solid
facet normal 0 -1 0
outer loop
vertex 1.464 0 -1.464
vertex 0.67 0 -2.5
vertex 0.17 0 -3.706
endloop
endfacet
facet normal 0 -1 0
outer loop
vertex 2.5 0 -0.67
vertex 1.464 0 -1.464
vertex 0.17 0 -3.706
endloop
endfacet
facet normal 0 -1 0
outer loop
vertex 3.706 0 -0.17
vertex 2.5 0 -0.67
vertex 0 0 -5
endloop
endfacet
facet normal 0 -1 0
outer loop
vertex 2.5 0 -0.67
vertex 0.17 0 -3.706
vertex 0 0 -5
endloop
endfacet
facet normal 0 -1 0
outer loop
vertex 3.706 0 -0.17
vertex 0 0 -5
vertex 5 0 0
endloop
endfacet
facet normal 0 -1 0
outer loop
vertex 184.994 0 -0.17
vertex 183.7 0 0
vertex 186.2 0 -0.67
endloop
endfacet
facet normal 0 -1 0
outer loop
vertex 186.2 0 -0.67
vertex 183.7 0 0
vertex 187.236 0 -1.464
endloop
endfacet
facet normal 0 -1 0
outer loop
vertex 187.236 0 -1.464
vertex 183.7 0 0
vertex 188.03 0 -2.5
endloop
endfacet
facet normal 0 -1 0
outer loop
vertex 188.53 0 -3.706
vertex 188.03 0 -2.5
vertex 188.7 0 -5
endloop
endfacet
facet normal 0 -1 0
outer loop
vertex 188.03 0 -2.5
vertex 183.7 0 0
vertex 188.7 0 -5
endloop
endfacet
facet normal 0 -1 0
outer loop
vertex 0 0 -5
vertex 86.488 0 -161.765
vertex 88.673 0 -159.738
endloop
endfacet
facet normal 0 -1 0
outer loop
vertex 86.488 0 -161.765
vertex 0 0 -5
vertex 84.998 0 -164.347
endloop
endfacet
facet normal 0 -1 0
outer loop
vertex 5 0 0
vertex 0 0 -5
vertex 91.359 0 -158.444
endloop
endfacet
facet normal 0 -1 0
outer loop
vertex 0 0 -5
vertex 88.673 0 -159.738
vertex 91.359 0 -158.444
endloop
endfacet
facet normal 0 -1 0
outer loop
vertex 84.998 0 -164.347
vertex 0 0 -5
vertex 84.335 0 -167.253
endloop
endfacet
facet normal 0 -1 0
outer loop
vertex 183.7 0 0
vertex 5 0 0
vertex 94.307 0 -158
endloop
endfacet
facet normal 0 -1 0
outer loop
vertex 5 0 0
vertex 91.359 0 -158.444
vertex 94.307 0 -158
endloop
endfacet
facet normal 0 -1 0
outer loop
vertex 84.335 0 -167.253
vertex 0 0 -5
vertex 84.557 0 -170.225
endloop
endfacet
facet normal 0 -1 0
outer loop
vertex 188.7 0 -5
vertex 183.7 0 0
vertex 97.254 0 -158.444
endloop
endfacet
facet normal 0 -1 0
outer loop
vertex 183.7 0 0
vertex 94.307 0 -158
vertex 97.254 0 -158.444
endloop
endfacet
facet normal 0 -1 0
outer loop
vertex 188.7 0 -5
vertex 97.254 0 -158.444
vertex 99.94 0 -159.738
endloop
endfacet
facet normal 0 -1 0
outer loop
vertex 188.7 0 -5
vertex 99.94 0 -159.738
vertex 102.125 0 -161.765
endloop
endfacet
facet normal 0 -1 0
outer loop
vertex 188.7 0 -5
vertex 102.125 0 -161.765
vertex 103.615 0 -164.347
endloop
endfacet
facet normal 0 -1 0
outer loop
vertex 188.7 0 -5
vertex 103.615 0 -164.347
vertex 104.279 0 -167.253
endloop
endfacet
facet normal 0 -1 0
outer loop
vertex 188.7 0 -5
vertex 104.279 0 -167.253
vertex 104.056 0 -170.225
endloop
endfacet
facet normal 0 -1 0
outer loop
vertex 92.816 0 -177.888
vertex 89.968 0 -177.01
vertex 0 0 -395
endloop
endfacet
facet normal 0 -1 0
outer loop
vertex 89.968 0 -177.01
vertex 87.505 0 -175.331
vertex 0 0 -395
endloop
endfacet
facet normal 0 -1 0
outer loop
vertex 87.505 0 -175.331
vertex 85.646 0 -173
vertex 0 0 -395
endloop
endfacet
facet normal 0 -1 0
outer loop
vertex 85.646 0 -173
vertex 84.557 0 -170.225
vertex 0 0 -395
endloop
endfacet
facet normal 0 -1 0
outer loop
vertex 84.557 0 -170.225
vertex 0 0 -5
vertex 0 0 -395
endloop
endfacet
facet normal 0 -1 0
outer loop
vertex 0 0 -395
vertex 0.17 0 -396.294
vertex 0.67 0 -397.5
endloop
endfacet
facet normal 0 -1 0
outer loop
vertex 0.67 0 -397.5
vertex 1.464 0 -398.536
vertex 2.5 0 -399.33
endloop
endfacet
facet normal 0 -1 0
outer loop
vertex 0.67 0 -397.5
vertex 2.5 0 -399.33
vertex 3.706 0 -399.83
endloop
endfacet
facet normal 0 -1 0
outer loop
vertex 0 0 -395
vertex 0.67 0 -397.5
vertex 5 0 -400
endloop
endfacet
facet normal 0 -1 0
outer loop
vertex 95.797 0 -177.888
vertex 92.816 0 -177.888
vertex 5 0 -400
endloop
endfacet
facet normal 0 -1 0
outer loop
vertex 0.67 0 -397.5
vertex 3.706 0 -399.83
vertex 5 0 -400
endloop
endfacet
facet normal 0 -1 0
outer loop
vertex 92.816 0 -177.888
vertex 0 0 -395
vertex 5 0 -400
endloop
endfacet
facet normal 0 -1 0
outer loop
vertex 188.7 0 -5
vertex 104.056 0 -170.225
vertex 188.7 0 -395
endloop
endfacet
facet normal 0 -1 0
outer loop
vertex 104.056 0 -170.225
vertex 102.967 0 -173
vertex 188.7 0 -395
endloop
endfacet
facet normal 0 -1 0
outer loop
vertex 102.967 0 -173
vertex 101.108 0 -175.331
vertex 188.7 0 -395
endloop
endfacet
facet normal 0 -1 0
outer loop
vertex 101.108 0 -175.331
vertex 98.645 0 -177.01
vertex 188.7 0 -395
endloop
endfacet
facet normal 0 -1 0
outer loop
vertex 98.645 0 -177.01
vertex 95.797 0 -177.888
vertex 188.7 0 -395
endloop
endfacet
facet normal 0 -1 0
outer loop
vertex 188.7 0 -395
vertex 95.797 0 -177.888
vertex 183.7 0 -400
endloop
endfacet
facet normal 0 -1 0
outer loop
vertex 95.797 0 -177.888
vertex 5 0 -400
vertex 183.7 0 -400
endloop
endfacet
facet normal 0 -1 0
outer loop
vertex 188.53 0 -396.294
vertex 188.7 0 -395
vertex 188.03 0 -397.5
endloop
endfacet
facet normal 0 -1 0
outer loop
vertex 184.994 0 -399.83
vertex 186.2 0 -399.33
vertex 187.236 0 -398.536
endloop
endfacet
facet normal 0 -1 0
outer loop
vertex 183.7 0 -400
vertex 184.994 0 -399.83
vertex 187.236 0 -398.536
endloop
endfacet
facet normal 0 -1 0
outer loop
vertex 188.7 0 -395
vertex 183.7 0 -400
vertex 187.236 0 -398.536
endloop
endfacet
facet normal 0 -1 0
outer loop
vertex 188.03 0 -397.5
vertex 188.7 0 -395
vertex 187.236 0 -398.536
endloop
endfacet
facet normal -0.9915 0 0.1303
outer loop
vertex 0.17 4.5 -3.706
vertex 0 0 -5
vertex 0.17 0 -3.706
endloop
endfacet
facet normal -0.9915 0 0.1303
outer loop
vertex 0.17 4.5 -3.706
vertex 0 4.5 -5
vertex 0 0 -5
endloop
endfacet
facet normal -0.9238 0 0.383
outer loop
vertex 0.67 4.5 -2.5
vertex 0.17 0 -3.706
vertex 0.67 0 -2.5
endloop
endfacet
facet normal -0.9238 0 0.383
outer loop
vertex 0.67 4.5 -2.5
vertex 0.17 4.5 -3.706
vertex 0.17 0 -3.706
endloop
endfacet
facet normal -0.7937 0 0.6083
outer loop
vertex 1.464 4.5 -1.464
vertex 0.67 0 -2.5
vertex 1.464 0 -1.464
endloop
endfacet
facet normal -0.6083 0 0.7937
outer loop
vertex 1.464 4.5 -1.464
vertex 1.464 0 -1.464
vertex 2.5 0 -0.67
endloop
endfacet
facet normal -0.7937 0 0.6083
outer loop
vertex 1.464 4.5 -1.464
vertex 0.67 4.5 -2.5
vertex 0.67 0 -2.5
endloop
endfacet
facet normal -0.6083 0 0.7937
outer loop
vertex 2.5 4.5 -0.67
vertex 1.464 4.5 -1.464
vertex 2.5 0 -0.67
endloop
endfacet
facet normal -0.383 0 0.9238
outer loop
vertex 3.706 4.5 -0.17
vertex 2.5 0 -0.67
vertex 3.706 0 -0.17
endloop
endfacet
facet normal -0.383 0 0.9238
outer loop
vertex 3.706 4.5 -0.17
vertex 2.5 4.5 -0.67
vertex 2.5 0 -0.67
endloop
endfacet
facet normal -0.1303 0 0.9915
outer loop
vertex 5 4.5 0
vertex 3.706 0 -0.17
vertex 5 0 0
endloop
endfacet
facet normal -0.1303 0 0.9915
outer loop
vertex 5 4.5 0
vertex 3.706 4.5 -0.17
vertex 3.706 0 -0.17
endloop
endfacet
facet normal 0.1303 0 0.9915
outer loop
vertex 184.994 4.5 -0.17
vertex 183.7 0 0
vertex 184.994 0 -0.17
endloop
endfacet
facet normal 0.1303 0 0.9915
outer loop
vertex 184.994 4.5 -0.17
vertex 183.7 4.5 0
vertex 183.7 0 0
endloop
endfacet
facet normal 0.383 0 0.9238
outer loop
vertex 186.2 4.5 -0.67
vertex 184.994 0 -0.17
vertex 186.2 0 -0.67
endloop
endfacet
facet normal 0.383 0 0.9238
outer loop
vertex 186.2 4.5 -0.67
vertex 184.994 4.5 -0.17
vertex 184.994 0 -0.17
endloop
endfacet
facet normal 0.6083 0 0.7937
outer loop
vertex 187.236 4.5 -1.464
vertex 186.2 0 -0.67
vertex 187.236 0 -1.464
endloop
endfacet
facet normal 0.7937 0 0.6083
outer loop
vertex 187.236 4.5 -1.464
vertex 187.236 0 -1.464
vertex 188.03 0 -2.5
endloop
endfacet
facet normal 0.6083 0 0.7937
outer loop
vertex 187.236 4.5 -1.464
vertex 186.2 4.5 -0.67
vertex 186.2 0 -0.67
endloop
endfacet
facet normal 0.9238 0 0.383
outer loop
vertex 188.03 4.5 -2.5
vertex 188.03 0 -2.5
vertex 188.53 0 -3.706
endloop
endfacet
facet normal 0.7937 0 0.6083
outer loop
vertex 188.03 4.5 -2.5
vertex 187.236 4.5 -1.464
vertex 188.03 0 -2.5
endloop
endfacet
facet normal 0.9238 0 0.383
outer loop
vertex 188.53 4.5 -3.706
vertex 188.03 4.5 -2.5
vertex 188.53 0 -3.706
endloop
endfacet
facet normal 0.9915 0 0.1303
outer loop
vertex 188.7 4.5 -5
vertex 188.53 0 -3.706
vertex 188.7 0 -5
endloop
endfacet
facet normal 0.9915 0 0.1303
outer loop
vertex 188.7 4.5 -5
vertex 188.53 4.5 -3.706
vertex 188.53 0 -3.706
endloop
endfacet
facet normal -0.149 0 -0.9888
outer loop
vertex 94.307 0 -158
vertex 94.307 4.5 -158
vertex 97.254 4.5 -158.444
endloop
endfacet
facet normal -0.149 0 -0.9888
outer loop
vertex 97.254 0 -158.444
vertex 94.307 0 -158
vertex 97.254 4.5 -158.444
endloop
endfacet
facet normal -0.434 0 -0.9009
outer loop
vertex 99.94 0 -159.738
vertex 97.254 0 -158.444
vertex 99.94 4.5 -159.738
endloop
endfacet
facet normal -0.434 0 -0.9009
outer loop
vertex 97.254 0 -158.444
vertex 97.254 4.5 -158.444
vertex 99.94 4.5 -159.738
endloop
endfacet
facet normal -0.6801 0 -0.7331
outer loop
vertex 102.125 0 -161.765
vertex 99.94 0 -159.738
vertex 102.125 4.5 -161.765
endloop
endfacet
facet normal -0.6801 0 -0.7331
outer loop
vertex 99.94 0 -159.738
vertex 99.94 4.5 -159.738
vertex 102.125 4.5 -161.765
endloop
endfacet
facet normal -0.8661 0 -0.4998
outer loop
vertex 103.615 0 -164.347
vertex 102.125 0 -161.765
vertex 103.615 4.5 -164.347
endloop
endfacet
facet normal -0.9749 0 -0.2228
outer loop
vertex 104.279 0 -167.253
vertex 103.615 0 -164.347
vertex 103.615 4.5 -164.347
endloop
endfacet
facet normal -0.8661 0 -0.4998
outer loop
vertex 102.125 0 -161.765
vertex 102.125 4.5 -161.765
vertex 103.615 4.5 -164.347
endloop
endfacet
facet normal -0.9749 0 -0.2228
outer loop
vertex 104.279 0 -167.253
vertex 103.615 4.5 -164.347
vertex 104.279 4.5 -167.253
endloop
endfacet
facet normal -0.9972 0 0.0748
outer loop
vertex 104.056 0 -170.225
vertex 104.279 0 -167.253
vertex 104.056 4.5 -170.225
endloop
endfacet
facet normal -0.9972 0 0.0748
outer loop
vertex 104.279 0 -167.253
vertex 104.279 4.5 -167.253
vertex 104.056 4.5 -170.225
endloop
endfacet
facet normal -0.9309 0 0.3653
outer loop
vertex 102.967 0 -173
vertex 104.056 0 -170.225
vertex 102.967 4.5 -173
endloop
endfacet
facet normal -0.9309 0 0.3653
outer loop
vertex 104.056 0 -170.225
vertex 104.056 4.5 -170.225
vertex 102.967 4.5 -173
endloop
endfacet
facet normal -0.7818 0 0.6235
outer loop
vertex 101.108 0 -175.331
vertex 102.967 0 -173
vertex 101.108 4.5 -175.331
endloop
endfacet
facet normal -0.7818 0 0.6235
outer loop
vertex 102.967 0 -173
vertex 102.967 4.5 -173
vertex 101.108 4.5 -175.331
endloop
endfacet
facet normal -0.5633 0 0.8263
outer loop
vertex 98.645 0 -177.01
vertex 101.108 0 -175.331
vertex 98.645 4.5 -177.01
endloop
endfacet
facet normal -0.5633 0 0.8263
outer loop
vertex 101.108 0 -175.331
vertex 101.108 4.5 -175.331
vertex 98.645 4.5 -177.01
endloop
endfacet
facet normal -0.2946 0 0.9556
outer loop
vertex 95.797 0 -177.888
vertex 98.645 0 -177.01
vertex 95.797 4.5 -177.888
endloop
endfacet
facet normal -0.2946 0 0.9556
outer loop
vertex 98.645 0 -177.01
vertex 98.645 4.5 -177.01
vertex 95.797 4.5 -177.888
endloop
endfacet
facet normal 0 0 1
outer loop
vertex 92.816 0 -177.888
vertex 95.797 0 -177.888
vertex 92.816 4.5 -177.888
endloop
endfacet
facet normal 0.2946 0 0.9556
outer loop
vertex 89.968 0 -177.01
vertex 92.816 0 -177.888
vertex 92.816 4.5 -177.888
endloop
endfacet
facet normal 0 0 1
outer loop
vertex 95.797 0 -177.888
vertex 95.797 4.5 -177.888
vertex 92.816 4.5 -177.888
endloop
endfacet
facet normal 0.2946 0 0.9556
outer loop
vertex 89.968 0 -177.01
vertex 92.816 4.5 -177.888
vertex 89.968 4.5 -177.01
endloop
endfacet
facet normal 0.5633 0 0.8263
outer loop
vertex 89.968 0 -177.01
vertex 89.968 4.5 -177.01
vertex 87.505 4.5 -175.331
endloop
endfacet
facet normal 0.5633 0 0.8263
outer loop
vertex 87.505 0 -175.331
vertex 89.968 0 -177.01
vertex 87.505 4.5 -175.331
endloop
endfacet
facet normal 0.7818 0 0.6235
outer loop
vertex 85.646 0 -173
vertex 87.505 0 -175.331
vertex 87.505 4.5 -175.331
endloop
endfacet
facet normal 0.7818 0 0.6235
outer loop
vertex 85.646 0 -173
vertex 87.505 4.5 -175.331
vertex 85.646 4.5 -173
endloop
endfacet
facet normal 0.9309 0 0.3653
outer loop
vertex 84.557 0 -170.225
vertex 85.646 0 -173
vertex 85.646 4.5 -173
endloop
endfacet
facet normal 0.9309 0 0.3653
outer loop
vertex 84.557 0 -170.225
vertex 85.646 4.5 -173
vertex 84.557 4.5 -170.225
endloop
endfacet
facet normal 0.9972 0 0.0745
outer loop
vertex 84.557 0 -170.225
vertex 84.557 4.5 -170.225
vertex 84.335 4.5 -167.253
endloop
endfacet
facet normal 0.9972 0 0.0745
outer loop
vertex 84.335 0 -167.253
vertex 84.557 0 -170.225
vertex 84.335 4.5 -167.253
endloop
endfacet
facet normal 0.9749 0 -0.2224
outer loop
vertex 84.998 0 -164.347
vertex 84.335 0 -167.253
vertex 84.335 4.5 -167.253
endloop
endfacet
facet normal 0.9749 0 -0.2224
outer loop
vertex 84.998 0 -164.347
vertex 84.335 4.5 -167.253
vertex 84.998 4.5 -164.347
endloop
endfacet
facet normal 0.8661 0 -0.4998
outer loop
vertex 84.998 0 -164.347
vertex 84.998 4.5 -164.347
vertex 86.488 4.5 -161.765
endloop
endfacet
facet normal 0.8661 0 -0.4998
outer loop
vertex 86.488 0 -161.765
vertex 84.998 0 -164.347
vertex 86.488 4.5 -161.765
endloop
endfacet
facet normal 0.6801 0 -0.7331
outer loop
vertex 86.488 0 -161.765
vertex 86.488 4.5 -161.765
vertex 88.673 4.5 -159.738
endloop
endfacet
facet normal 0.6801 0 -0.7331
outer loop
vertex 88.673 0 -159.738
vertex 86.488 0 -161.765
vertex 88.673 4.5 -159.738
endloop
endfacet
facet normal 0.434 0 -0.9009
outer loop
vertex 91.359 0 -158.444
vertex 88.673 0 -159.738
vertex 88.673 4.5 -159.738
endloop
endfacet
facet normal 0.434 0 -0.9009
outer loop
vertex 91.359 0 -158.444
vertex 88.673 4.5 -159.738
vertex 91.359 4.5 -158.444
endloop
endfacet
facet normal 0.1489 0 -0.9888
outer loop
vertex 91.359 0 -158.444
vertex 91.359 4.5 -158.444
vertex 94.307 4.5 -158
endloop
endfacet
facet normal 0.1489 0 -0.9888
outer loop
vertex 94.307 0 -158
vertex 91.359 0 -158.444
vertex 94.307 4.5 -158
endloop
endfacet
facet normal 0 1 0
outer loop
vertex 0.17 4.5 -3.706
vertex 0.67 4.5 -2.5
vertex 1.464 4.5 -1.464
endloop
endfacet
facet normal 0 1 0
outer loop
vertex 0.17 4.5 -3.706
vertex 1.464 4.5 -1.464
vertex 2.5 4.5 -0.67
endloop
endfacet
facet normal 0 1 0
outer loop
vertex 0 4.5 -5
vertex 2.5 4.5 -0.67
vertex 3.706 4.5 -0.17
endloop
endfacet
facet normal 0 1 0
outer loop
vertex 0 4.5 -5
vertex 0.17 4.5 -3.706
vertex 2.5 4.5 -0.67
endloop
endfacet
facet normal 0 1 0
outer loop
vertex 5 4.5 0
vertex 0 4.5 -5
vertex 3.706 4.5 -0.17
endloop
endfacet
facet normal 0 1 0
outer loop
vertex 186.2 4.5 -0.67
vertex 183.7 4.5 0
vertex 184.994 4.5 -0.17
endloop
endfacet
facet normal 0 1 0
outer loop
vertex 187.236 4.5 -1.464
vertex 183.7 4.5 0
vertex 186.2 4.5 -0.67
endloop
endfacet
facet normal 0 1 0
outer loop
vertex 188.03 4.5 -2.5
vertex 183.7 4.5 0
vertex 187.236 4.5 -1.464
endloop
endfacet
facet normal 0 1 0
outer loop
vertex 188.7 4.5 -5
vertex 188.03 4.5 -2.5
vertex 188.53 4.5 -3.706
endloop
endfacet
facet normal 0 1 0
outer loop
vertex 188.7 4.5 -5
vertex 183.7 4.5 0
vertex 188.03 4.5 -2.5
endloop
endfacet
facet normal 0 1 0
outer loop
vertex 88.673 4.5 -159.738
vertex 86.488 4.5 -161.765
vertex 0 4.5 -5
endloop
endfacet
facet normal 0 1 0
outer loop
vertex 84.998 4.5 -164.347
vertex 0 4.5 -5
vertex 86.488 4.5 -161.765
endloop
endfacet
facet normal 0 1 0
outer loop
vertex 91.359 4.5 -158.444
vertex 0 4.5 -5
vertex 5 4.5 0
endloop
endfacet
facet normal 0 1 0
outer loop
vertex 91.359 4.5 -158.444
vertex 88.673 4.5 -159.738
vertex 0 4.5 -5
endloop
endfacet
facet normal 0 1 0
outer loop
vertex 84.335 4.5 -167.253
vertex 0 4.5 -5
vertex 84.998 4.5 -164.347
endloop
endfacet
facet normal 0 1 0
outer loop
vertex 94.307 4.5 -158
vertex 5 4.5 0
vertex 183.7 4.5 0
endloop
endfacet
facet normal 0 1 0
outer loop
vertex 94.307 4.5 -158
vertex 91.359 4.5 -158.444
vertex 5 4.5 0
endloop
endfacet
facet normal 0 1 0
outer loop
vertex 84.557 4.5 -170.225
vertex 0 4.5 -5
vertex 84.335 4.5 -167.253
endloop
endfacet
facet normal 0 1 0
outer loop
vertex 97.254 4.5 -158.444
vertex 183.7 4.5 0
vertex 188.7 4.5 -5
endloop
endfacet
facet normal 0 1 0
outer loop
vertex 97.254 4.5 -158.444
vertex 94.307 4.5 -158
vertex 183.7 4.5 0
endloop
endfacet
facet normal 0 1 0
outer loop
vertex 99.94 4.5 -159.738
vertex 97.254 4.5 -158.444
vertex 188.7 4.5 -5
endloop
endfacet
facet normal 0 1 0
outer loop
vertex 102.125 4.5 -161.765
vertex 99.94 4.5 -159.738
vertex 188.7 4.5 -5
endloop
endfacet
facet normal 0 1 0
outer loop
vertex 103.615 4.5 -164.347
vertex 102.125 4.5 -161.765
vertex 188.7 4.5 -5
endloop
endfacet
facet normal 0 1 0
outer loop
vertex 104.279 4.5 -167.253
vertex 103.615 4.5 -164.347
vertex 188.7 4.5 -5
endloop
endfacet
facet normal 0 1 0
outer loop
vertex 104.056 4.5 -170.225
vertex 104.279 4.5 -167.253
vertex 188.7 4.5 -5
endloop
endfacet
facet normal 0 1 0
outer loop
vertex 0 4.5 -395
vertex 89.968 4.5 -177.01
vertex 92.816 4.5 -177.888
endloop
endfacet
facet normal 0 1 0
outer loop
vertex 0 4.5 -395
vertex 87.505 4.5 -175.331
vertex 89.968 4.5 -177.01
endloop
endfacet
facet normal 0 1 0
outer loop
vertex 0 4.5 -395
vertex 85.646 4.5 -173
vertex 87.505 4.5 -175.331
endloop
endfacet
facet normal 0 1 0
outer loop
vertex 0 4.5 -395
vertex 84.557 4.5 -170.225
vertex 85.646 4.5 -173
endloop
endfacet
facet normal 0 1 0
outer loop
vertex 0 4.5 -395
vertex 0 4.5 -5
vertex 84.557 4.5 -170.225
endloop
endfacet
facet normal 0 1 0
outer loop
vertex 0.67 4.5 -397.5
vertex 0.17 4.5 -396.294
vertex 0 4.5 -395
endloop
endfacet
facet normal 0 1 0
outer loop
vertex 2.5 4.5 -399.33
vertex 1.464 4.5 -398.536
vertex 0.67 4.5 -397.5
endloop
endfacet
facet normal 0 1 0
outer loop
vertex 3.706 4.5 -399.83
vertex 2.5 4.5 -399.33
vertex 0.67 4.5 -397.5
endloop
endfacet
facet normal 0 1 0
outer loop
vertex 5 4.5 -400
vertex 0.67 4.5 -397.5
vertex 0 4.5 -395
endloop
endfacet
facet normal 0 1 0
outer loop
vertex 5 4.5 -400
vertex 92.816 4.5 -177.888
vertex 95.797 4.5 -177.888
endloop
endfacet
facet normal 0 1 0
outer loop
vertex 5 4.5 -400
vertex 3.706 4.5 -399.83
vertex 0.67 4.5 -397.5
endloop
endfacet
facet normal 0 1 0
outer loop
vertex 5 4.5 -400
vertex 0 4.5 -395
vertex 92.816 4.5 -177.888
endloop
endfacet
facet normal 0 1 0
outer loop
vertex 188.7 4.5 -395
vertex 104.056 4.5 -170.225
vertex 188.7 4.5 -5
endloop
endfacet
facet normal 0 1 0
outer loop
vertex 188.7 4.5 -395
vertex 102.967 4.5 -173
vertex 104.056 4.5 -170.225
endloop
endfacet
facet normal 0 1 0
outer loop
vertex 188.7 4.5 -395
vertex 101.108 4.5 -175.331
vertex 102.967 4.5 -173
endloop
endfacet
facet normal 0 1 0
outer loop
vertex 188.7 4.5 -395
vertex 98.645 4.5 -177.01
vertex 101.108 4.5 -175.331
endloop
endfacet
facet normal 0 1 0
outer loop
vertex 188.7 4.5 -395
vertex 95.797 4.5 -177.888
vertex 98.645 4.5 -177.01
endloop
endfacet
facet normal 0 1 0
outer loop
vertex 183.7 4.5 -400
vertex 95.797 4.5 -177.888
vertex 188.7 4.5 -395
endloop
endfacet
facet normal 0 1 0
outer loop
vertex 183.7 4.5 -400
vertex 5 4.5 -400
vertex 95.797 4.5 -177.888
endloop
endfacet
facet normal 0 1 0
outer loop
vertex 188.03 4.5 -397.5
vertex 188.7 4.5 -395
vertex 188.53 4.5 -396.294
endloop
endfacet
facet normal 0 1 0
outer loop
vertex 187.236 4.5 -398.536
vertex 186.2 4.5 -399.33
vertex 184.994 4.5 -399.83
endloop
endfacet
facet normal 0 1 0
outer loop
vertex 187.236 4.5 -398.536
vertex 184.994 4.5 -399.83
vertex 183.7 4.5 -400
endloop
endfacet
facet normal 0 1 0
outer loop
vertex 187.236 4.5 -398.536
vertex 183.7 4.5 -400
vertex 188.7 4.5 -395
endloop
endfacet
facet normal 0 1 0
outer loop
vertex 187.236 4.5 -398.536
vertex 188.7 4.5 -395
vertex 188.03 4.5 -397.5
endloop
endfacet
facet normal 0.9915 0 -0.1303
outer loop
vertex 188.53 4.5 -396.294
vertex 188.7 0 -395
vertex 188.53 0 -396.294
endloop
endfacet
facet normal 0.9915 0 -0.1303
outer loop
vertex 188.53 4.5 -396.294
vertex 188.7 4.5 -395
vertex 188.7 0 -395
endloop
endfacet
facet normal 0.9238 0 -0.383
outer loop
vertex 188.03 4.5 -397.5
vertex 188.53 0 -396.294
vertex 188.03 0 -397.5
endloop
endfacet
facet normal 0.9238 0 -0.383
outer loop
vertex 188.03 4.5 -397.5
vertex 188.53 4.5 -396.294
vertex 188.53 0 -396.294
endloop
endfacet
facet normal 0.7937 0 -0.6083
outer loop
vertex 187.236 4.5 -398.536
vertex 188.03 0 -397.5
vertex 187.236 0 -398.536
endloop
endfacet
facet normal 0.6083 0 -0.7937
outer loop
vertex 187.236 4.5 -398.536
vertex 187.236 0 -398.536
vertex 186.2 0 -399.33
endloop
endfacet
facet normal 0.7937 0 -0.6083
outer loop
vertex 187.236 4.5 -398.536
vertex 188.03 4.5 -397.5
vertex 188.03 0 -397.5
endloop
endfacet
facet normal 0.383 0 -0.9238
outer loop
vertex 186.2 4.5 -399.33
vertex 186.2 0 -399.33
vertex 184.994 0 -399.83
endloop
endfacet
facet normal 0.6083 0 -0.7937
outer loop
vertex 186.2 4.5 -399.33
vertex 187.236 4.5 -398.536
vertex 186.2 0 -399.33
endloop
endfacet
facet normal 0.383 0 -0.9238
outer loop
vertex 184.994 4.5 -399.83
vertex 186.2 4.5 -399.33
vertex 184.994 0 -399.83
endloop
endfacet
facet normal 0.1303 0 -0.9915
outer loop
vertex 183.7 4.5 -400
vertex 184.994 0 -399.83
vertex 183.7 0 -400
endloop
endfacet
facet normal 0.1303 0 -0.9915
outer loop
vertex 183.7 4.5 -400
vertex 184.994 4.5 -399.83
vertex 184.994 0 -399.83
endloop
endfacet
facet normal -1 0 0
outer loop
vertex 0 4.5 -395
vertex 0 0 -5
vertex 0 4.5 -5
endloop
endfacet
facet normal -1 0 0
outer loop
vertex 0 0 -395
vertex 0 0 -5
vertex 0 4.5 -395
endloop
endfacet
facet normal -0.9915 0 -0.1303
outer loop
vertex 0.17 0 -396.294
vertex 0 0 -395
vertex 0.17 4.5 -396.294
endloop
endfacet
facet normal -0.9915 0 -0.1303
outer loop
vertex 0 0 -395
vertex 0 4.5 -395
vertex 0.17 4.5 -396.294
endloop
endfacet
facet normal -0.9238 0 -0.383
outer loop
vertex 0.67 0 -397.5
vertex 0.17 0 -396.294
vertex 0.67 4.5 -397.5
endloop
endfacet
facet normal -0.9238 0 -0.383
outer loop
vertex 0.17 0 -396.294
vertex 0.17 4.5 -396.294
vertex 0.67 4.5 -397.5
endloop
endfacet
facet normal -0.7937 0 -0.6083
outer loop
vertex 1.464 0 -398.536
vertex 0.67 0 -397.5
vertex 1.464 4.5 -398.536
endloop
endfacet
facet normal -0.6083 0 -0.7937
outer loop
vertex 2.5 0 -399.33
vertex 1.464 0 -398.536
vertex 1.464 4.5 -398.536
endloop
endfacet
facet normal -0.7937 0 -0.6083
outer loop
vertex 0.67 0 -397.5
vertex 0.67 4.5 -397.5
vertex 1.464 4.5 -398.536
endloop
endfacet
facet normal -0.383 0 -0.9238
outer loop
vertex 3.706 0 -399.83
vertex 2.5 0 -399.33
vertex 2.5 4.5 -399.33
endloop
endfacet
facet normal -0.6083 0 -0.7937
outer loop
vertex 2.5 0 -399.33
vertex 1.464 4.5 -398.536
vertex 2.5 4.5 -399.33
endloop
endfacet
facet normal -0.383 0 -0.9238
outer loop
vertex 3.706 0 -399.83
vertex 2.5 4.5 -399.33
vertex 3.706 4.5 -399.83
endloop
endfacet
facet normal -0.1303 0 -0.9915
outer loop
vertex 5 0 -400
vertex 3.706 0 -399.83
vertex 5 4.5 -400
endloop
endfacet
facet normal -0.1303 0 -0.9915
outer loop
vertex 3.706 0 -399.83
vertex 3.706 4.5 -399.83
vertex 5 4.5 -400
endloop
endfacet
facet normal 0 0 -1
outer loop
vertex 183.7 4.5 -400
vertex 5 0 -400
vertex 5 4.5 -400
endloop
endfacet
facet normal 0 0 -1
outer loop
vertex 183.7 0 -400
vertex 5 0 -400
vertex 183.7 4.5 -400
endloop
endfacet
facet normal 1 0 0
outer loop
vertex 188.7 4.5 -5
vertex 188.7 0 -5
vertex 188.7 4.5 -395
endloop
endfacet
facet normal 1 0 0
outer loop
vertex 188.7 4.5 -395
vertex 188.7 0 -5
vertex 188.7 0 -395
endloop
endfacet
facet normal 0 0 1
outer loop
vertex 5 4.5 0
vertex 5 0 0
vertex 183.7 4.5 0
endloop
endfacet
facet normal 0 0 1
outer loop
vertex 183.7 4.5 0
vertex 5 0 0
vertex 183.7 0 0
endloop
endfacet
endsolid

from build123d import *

# Parameters (mm, degrees)
SKETCH1_W           = 188.7
SKETCH1_H           = 400
BOSS_EXTRUDE1_DEPTH = 4.5
FILLET1_R           = 5
SKETCH3_R           = 10
CUT_EXTRUDE2_DEPTH  = 20


with BuildPart() as part:
    # Sketch1 → Boss-Extrude1 (new body)
    with BuildSketch(Plane(origin=(0, 0, 0), x_dir=(1, 0, 0), z_dir=(0, 1, 0))):
        with Locations((94.35, 200)):
            Rectangle(SKETCH1_W, SKETCH1_H)
    extrude(amount=BOSS_EXTRUDE1_DEPTH)

    # Fillet1
    fillet1_edges = [part.edges().sort_by_distance(p)[0] for p in [
        (0, 2.25, -400),
        (188.7, 2.25, -400),
        (188.7, 2.25, 0),
        (0, 2.25, 0),
    ]]
    fillet(fillet1_edges, radius=FILLET1_R)

    # Sketch3 → Cut-Extrude2 (cut)
    with BuildSketch(Plane(origin=(0, 4.5, 0), x_dir=(1, 0, 0), z_dir=(0, 1, 0))):
        with Locations(Location((94.306601718, 168, 0), (0, 0, 270))):
            Circle(SKETCH3_R)
    extrude(amount=-CUT_EXTRUDE2_DEPTH, mode=Mode.SUBTRACT)


solid = part.part
